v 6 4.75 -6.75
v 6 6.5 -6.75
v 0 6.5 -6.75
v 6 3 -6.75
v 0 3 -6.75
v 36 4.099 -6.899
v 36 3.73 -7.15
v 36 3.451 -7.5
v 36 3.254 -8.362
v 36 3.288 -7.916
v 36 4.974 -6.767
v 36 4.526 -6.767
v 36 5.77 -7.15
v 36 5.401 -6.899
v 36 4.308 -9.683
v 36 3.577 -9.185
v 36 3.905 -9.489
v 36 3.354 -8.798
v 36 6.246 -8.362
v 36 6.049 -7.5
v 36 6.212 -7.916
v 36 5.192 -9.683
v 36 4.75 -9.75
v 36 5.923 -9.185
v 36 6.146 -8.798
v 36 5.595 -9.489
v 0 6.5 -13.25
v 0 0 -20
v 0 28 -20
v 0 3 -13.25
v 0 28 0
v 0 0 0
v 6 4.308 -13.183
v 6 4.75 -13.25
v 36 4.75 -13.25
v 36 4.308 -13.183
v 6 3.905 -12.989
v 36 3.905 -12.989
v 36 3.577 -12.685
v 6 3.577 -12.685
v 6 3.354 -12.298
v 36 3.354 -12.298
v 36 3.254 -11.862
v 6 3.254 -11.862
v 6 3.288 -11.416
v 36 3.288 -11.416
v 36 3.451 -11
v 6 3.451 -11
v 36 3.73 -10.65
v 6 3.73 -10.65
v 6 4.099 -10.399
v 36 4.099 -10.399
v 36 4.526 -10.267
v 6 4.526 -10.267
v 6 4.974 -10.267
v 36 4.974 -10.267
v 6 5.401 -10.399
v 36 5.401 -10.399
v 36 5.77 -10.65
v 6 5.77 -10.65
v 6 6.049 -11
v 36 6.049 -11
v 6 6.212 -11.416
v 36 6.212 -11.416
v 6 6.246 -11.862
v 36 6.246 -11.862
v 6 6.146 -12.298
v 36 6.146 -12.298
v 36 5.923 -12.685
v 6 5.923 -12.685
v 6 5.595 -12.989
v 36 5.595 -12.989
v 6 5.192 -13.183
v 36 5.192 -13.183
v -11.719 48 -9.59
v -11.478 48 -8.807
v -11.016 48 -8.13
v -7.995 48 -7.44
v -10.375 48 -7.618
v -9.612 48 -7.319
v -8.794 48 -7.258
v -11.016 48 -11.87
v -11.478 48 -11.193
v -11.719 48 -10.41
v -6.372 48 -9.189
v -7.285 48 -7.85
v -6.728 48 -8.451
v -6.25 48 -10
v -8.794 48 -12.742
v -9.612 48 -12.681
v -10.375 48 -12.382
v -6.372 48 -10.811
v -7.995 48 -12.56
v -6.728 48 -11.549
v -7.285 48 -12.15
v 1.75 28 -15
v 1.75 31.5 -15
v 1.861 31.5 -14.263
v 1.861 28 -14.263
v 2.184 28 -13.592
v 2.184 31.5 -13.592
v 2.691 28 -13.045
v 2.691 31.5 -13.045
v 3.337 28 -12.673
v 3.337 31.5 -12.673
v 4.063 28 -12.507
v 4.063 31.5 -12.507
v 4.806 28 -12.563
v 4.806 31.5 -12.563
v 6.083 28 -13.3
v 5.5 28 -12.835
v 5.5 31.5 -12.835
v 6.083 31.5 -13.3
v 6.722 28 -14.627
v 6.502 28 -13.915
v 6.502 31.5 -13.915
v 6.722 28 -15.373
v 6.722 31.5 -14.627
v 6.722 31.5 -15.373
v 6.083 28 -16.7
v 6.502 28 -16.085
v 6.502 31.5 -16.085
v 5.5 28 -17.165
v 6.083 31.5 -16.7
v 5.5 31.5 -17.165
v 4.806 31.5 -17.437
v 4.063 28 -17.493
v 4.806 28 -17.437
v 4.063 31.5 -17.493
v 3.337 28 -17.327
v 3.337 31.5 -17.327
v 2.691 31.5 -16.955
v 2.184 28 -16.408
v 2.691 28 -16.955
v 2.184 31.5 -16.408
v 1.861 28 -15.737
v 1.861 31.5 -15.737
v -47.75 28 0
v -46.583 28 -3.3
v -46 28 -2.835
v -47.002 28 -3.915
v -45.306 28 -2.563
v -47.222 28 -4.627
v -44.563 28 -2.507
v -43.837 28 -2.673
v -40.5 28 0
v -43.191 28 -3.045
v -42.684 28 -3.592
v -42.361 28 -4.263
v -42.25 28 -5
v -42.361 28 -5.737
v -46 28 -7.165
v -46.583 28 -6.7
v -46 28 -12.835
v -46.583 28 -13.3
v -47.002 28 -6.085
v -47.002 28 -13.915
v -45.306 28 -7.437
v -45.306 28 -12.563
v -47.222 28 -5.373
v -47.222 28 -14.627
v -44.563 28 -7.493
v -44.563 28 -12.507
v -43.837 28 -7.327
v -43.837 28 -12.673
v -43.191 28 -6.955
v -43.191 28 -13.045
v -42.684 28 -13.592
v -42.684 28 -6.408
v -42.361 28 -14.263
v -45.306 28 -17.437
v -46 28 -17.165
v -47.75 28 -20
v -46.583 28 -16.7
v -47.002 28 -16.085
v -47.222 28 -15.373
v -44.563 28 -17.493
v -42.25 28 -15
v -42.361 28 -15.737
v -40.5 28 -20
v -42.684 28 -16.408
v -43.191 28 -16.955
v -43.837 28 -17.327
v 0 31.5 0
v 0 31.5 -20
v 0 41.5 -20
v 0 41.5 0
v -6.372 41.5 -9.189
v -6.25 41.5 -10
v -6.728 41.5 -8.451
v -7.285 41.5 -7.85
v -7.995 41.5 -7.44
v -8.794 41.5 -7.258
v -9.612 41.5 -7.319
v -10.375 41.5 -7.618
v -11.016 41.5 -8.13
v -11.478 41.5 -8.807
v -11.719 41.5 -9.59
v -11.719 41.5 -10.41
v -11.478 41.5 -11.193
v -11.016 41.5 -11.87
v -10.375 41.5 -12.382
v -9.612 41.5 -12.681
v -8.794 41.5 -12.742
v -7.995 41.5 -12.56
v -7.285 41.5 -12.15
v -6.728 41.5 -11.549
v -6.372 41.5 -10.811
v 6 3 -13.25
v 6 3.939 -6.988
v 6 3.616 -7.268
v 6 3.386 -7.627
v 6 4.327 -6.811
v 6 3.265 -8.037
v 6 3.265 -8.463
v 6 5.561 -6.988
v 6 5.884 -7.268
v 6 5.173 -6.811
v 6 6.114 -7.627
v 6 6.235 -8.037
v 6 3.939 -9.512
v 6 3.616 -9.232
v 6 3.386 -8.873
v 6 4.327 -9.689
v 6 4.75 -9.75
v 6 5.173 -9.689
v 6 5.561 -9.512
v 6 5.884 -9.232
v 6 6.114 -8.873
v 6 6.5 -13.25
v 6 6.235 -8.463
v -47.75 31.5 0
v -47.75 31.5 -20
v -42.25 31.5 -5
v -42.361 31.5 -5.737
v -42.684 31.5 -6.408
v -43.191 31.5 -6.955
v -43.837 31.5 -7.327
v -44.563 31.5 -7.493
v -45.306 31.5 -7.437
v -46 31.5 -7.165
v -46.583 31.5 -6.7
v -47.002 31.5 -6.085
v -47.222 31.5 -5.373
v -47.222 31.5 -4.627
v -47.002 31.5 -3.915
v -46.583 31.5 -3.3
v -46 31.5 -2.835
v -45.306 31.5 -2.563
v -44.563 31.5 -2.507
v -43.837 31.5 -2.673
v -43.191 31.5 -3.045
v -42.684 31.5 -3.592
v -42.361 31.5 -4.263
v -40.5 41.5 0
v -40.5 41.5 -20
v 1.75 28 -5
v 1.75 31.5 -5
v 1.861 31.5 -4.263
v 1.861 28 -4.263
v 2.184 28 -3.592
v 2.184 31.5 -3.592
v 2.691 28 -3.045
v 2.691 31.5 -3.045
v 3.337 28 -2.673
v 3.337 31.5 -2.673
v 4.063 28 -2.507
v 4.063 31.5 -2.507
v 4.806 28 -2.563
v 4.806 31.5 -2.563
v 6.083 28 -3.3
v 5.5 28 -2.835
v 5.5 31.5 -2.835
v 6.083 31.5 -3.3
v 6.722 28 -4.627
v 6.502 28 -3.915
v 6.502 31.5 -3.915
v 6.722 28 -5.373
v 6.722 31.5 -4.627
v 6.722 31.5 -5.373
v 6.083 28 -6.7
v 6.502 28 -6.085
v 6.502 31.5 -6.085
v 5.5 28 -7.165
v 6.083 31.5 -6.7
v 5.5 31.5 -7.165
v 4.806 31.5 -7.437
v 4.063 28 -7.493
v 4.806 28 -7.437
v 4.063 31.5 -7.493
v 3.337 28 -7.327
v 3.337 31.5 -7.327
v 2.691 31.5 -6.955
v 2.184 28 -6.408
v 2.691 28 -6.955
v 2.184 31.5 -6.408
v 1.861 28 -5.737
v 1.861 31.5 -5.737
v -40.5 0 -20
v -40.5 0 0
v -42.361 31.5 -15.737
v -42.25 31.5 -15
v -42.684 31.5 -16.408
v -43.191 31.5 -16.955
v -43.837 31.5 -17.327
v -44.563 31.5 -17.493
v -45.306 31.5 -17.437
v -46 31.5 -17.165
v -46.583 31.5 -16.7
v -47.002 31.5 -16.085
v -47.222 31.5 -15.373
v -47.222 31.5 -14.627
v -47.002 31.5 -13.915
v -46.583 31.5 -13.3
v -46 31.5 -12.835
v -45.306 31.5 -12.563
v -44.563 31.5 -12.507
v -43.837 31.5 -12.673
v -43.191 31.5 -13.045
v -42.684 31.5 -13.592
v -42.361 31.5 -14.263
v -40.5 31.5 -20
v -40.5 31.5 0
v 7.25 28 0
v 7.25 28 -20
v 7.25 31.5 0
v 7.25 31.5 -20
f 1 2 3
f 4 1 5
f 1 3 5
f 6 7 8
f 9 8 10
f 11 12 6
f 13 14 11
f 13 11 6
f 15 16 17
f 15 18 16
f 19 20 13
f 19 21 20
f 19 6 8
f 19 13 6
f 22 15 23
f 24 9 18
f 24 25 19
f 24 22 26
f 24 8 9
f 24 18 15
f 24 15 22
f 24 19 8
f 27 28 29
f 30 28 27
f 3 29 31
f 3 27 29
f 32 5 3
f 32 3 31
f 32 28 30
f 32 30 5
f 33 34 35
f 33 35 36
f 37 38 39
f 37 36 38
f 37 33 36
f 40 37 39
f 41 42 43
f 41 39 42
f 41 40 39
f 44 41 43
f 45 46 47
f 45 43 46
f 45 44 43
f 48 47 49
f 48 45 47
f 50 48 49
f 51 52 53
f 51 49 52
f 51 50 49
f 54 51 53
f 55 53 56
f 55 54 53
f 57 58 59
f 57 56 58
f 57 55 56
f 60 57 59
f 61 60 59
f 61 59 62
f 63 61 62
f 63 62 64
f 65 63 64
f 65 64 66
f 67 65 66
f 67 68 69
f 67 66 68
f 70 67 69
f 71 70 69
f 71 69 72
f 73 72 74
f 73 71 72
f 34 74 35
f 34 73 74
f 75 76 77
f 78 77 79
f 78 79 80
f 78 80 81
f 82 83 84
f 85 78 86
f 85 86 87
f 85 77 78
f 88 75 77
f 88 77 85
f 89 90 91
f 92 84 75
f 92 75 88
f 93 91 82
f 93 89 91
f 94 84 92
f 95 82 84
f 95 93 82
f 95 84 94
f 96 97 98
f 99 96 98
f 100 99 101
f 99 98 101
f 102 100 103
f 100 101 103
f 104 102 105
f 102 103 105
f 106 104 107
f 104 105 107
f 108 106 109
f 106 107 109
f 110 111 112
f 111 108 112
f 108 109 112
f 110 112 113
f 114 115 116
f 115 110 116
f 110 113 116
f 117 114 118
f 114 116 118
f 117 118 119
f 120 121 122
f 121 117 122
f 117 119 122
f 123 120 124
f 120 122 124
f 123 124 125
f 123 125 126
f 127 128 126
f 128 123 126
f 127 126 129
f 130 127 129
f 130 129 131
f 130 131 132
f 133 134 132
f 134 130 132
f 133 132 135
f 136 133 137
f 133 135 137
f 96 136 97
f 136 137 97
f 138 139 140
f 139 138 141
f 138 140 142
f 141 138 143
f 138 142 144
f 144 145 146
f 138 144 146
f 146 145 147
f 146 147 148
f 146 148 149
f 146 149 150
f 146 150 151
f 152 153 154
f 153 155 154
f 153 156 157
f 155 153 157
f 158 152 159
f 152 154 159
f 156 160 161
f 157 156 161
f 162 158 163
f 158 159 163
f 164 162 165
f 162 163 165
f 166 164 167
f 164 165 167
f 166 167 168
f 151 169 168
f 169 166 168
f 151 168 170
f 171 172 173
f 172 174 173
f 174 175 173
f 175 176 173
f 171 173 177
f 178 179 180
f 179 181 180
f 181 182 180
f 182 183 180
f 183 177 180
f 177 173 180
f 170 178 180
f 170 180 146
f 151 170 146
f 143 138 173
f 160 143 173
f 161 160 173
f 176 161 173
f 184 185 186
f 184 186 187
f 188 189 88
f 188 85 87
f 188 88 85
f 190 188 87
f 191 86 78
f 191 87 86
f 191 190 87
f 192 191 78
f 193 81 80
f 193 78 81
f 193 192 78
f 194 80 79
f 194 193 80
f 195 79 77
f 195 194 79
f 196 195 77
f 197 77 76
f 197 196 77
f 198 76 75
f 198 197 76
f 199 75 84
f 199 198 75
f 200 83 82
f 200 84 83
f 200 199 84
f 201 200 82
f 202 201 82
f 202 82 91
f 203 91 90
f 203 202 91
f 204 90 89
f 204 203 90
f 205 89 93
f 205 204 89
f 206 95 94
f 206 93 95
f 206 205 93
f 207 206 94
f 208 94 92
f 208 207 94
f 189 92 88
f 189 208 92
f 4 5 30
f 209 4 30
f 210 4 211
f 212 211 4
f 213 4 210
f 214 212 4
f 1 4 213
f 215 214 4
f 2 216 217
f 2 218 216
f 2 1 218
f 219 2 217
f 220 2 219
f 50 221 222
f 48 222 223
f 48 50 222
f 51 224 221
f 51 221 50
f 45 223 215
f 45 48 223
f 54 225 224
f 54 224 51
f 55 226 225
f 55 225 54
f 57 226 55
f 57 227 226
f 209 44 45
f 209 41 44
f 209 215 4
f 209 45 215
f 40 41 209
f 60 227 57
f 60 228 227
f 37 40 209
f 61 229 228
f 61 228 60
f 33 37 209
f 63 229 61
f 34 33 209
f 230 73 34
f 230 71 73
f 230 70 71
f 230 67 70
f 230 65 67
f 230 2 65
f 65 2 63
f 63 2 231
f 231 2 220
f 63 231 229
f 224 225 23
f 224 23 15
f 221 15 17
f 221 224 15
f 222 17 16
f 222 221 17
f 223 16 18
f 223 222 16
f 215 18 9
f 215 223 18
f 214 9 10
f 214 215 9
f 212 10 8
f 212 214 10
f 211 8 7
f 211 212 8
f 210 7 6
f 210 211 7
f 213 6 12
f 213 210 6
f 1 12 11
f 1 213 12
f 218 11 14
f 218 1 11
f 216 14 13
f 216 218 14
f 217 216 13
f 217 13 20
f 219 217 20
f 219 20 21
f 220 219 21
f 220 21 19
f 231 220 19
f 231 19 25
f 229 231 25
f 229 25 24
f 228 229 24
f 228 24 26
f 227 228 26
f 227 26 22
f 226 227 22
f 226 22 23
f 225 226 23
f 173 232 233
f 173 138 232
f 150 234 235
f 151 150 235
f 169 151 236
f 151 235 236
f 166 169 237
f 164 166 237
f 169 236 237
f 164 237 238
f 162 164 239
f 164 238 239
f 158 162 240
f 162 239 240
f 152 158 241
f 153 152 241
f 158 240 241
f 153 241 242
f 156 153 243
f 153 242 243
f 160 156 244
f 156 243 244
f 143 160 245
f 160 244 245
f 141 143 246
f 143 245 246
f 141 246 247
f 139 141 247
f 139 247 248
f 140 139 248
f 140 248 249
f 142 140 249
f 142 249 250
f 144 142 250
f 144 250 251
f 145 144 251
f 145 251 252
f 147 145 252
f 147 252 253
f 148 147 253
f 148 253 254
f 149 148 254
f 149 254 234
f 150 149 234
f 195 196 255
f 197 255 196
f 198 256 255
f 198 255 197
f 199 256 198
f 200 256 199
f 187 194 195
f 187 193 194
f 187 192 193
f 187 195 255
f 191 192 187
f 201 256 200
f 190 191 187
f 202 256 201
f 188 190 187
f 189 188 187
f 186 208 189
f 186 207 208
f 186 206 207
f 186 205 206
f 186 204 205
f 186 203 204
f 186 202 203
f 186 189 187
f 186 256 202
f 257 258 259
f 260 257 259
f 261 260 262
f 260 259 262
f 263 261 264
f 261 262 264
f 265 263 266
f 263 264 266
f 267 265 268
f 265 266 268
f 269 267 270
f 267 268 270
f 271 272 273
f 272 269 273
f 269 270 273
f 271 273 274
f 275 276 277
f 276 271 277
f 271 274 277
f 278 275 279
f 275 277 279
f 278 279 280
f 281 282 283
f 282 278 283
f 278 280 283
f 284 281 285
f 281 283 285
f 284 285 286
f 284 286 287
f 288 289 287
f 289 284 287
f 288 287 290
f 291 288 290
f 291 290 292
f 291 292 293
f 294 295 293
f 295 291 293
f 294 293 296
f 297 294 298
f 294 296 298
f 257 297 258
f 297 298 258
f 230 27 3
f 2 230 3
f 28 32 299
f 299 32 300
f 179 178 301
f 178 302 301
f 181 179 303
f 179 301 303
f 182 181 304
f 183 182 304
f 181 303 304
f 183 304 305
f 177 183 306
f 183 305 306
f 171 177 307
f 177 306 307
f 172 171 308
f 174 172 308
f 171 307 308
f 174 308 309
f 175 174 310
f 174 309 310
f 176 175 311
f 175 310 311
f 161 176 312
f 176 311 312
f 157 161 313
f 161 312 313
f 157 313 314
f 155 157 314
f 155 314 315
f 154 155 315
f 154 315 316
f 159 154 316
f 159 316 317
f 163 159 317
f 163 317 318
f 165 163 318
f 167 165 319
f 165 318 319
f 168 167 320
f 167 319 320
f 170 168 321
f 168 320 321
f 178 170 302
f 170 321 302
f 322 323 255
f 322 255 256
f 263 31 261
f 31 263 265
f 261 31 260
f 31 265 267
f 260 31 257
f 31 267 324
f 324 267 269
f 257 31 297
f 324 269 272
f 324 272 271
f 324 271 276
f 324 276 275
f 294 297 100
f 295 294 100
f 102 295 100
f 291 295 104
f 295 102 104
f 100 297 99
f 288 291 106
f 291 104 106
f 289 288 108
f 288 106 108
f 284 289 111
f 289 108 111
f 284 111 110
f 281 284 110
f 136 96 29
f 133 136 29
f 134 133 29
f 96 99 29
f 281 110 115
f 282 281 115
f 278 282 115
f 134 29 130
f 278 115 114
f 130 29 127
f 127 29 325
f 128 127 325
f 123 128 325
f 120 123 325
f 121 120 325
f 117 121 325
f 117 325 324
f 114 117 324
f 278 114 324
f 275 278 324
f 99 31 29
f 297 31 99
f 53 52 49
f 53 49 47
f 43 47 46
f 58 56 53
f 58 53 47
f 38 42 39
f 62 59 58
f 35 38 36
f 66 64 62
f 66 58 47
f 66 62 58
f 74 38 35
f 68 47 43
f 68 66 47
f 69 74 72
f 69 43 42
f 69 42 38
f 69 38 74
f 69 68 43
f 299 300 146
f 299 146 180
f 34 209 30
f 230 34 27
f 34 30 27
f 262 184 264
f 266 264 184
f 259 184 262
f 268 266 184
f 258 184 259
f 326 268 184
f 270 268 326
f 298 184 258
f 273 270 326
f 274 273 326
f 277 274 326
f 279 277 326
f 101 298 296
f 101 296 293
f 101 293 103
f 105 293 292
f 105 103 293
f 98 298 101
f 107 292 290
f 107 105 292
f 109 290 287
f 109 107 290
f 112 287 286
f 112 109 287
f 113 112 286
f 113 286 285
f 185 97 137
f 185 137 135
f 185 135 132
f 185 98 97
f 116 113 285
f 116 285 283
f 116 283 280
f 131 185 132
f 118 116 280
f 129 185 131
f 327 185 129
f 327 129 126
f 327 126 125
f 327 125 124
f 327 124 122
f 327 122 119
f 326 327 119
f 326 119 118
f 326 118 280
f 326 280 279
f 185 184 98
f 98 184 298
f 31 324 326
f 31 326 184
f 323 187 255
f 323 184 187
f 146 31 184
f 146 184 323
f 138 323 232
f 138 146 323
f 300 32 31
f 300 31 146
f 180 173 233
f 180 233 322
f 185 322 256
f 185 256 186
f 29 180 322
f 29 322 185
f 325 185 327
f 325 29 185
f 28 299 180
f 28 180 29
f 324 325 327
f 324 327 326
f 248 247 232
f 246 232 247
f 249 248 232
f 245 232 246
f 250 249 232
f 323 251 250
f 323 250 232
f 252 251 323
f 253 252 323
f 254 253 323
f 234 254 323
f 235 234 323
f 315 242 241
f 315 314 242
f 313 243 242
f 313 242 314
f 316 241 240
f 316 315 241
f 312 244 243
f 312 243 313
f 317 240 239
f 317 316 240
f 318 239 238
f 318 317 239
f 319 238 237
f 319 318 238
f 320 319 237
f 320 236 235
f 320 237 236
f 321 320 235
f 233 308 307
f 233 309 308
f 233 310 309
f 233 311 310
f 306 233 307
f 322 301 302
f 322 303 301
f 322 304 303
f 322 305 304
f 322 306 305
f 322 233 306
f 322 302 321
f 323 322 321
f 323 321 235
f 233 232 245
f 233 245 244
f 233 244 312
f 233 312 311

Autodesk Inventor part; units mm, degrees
ref_plane "YZ Plane" through (0, 0, 0) normal (1, 0, 0) x (0, 1, 0)
ref_plane "XZ Plane" through (0, 0, 0) normal (0, 1, 0) x (-1, 0, 0)
ref_plane "XY Plane" through (0, 0, 0) normal (0, 0, 1) x (1, 0, 0)
sketch "Sketch1" plane through (0, 0, 0) normal (0, 1, 0) x (-1, 0, 0)
  line L0 (0, 0) -> (40.5, 0)
  line L1 (40.5, 0) -> (40.5, -20)
  line L2 (40.5, -20) -> (0, -20)
  line L3 (0, -20) -> (0, 0)
  dimension "d0" = 20
  dimension "d1" = 40.5
extrude "Extrusion1" add sketch "Sketch1" along normal blind 28
sketch "Sketch2" plane through (0, 28, 0) normal (0, 1, 0) x (1, 0, 0)
  line L0 (7.25, 0) -> (-47.75, 0)
  line L1 (-47.75, 0) -> (-47.75, 20)
  line L2 (-47.75, 20) -> (7.25, 20)
  line L3 (7.25, 20) -> (7.25, 0)
  line L4 (0, 20) -> (-40.5, 20) projected
  line L5 (-40.5, 20) -> (-40.5, 0) projected
  line L6 (-40.5, 0) -> (0, 0) projected
  dimension "d4" = 0
  dimension "d5" = 55
  dimension "d6" = 7.25
  dimension "d7" = 0
extrude "Extrusion2" add sketch "Sketch2" along normal blind 3.5
sketch "Sketch3" plane through (0, 31.5, 0) normal (0, 1, 0) x (1, 0, 0)
  circle A0 centre (-44.75, 5) radius 2.5
  circle A1 centre (-44.75, 15) radius 2.5
  line L0 (-47.75, 0) -> (7.25, 0) projected
  line L1 (7.25, 20) -> (-47.75, 20) projected
  line L2 (-47.75, 20) -> (-47.75, 0) projected
  point P0 (0, 0)
  dimension "d10" = 5
  dimension "d11" = 5
  dimension "d12" = 5
  dimension "d14" = 5
  dimension "d15" = 3
  dimension "d16" = 3
extrude "Extrusion3" cut sketch "Sketch3" against normal blind 3.5
ref_plane "Work Plane1" through (-20.25, 28, 0) normal (1, 0, 0) x (0, 0, -1)
mirror "Mirror1" about plane through (-20.25, 28, 0) normal (1, 0, 0) of "Extrusion3"
sketch "Sketch4" plane through (0, 31.5, 0) normal (0, 1, 0) x (1, 0, 0)
  line L0 (0, 0) -> (-40.5, 0)
  line L1 (-40.5, 0) -> (-40.5, 20)
  line L2 (-40.5, 20) -> (0, 20)
  line L3 (0, 20) -> (0, 0)
extrude "Extrusion4" add sketch "Sketch4" along normal blind 10
sketch "Sketch5" plane through (0, 41.5, 0) normal (0, 1, 0) x (1, 0, 0)
  circle A0 centre (-9, 10) radius 2.75
  line L0 (0, 0) -> (0, 20) projected
  line L1 (-40.5, 0) -> (0, 0) projected
  line L2 (-40.5, 20) -> (-40.5, 0) projected
  dimension "d22" = 10
  dimension "d23" = 5.5
  dimension "d40" = 31.5
extrude "Extrusion5" add sketch "Sketch5" along normal blind 6.5
sketch "Sketch6" plane through (0, 0, 0) normal (1, 0, 0) x (0, 0, -1)
  line L0 (6.75, 3) -> (13.25, 3)
  line L1 (13.25, 3) -> (13.25, 6.5)
  line L2 (13.25, 6.5) -> (6.75, 6.5)
  line L3 (6.75, 6.5) -> (6.75, 3)
  line L4 (0, 0) -> (20, 0) projected
  line L5 (0, 0) -> (0, 28) projected
  dimension "d26" = 3
  dimension "d27" = 6.5
  dimension "d28" = 3.5
  dimension "d29" = 6.75
extrude "Extrusion6" add sketch "Sketch6" along normal blind 6
sketch "Sketch7" plane through (6, 0, 0) normal (1, 0, 0) x (0, 0, -1)
  circle A0 centre (11.75, 4.75) radius 1.5
  circle A1 centre (8.25, 4.75) radius 1.5
  line L0 (6.75, 6.5) -> (6.75, 3) projected
  line L1 (13.25, 3) -> (13.25, 6.5) projected
  line L2 (6.75, 3) -> (13.25, 3) projected
  point P0 (0, 0)
  dimension "d32" = 3
  dimension "d33" = 3
  dimension "d34" = 1.5
  dimension "d35" = 1.5
  dimension "d36" = 1.75
  dimension "d37" = 1.75
extrude "Extrusion7" add sketch "Sketch7" along normal blind 30
equation "\"d33\" = d32"
equation "\"d37\" = d36"
properties part number "motor_25kg"
